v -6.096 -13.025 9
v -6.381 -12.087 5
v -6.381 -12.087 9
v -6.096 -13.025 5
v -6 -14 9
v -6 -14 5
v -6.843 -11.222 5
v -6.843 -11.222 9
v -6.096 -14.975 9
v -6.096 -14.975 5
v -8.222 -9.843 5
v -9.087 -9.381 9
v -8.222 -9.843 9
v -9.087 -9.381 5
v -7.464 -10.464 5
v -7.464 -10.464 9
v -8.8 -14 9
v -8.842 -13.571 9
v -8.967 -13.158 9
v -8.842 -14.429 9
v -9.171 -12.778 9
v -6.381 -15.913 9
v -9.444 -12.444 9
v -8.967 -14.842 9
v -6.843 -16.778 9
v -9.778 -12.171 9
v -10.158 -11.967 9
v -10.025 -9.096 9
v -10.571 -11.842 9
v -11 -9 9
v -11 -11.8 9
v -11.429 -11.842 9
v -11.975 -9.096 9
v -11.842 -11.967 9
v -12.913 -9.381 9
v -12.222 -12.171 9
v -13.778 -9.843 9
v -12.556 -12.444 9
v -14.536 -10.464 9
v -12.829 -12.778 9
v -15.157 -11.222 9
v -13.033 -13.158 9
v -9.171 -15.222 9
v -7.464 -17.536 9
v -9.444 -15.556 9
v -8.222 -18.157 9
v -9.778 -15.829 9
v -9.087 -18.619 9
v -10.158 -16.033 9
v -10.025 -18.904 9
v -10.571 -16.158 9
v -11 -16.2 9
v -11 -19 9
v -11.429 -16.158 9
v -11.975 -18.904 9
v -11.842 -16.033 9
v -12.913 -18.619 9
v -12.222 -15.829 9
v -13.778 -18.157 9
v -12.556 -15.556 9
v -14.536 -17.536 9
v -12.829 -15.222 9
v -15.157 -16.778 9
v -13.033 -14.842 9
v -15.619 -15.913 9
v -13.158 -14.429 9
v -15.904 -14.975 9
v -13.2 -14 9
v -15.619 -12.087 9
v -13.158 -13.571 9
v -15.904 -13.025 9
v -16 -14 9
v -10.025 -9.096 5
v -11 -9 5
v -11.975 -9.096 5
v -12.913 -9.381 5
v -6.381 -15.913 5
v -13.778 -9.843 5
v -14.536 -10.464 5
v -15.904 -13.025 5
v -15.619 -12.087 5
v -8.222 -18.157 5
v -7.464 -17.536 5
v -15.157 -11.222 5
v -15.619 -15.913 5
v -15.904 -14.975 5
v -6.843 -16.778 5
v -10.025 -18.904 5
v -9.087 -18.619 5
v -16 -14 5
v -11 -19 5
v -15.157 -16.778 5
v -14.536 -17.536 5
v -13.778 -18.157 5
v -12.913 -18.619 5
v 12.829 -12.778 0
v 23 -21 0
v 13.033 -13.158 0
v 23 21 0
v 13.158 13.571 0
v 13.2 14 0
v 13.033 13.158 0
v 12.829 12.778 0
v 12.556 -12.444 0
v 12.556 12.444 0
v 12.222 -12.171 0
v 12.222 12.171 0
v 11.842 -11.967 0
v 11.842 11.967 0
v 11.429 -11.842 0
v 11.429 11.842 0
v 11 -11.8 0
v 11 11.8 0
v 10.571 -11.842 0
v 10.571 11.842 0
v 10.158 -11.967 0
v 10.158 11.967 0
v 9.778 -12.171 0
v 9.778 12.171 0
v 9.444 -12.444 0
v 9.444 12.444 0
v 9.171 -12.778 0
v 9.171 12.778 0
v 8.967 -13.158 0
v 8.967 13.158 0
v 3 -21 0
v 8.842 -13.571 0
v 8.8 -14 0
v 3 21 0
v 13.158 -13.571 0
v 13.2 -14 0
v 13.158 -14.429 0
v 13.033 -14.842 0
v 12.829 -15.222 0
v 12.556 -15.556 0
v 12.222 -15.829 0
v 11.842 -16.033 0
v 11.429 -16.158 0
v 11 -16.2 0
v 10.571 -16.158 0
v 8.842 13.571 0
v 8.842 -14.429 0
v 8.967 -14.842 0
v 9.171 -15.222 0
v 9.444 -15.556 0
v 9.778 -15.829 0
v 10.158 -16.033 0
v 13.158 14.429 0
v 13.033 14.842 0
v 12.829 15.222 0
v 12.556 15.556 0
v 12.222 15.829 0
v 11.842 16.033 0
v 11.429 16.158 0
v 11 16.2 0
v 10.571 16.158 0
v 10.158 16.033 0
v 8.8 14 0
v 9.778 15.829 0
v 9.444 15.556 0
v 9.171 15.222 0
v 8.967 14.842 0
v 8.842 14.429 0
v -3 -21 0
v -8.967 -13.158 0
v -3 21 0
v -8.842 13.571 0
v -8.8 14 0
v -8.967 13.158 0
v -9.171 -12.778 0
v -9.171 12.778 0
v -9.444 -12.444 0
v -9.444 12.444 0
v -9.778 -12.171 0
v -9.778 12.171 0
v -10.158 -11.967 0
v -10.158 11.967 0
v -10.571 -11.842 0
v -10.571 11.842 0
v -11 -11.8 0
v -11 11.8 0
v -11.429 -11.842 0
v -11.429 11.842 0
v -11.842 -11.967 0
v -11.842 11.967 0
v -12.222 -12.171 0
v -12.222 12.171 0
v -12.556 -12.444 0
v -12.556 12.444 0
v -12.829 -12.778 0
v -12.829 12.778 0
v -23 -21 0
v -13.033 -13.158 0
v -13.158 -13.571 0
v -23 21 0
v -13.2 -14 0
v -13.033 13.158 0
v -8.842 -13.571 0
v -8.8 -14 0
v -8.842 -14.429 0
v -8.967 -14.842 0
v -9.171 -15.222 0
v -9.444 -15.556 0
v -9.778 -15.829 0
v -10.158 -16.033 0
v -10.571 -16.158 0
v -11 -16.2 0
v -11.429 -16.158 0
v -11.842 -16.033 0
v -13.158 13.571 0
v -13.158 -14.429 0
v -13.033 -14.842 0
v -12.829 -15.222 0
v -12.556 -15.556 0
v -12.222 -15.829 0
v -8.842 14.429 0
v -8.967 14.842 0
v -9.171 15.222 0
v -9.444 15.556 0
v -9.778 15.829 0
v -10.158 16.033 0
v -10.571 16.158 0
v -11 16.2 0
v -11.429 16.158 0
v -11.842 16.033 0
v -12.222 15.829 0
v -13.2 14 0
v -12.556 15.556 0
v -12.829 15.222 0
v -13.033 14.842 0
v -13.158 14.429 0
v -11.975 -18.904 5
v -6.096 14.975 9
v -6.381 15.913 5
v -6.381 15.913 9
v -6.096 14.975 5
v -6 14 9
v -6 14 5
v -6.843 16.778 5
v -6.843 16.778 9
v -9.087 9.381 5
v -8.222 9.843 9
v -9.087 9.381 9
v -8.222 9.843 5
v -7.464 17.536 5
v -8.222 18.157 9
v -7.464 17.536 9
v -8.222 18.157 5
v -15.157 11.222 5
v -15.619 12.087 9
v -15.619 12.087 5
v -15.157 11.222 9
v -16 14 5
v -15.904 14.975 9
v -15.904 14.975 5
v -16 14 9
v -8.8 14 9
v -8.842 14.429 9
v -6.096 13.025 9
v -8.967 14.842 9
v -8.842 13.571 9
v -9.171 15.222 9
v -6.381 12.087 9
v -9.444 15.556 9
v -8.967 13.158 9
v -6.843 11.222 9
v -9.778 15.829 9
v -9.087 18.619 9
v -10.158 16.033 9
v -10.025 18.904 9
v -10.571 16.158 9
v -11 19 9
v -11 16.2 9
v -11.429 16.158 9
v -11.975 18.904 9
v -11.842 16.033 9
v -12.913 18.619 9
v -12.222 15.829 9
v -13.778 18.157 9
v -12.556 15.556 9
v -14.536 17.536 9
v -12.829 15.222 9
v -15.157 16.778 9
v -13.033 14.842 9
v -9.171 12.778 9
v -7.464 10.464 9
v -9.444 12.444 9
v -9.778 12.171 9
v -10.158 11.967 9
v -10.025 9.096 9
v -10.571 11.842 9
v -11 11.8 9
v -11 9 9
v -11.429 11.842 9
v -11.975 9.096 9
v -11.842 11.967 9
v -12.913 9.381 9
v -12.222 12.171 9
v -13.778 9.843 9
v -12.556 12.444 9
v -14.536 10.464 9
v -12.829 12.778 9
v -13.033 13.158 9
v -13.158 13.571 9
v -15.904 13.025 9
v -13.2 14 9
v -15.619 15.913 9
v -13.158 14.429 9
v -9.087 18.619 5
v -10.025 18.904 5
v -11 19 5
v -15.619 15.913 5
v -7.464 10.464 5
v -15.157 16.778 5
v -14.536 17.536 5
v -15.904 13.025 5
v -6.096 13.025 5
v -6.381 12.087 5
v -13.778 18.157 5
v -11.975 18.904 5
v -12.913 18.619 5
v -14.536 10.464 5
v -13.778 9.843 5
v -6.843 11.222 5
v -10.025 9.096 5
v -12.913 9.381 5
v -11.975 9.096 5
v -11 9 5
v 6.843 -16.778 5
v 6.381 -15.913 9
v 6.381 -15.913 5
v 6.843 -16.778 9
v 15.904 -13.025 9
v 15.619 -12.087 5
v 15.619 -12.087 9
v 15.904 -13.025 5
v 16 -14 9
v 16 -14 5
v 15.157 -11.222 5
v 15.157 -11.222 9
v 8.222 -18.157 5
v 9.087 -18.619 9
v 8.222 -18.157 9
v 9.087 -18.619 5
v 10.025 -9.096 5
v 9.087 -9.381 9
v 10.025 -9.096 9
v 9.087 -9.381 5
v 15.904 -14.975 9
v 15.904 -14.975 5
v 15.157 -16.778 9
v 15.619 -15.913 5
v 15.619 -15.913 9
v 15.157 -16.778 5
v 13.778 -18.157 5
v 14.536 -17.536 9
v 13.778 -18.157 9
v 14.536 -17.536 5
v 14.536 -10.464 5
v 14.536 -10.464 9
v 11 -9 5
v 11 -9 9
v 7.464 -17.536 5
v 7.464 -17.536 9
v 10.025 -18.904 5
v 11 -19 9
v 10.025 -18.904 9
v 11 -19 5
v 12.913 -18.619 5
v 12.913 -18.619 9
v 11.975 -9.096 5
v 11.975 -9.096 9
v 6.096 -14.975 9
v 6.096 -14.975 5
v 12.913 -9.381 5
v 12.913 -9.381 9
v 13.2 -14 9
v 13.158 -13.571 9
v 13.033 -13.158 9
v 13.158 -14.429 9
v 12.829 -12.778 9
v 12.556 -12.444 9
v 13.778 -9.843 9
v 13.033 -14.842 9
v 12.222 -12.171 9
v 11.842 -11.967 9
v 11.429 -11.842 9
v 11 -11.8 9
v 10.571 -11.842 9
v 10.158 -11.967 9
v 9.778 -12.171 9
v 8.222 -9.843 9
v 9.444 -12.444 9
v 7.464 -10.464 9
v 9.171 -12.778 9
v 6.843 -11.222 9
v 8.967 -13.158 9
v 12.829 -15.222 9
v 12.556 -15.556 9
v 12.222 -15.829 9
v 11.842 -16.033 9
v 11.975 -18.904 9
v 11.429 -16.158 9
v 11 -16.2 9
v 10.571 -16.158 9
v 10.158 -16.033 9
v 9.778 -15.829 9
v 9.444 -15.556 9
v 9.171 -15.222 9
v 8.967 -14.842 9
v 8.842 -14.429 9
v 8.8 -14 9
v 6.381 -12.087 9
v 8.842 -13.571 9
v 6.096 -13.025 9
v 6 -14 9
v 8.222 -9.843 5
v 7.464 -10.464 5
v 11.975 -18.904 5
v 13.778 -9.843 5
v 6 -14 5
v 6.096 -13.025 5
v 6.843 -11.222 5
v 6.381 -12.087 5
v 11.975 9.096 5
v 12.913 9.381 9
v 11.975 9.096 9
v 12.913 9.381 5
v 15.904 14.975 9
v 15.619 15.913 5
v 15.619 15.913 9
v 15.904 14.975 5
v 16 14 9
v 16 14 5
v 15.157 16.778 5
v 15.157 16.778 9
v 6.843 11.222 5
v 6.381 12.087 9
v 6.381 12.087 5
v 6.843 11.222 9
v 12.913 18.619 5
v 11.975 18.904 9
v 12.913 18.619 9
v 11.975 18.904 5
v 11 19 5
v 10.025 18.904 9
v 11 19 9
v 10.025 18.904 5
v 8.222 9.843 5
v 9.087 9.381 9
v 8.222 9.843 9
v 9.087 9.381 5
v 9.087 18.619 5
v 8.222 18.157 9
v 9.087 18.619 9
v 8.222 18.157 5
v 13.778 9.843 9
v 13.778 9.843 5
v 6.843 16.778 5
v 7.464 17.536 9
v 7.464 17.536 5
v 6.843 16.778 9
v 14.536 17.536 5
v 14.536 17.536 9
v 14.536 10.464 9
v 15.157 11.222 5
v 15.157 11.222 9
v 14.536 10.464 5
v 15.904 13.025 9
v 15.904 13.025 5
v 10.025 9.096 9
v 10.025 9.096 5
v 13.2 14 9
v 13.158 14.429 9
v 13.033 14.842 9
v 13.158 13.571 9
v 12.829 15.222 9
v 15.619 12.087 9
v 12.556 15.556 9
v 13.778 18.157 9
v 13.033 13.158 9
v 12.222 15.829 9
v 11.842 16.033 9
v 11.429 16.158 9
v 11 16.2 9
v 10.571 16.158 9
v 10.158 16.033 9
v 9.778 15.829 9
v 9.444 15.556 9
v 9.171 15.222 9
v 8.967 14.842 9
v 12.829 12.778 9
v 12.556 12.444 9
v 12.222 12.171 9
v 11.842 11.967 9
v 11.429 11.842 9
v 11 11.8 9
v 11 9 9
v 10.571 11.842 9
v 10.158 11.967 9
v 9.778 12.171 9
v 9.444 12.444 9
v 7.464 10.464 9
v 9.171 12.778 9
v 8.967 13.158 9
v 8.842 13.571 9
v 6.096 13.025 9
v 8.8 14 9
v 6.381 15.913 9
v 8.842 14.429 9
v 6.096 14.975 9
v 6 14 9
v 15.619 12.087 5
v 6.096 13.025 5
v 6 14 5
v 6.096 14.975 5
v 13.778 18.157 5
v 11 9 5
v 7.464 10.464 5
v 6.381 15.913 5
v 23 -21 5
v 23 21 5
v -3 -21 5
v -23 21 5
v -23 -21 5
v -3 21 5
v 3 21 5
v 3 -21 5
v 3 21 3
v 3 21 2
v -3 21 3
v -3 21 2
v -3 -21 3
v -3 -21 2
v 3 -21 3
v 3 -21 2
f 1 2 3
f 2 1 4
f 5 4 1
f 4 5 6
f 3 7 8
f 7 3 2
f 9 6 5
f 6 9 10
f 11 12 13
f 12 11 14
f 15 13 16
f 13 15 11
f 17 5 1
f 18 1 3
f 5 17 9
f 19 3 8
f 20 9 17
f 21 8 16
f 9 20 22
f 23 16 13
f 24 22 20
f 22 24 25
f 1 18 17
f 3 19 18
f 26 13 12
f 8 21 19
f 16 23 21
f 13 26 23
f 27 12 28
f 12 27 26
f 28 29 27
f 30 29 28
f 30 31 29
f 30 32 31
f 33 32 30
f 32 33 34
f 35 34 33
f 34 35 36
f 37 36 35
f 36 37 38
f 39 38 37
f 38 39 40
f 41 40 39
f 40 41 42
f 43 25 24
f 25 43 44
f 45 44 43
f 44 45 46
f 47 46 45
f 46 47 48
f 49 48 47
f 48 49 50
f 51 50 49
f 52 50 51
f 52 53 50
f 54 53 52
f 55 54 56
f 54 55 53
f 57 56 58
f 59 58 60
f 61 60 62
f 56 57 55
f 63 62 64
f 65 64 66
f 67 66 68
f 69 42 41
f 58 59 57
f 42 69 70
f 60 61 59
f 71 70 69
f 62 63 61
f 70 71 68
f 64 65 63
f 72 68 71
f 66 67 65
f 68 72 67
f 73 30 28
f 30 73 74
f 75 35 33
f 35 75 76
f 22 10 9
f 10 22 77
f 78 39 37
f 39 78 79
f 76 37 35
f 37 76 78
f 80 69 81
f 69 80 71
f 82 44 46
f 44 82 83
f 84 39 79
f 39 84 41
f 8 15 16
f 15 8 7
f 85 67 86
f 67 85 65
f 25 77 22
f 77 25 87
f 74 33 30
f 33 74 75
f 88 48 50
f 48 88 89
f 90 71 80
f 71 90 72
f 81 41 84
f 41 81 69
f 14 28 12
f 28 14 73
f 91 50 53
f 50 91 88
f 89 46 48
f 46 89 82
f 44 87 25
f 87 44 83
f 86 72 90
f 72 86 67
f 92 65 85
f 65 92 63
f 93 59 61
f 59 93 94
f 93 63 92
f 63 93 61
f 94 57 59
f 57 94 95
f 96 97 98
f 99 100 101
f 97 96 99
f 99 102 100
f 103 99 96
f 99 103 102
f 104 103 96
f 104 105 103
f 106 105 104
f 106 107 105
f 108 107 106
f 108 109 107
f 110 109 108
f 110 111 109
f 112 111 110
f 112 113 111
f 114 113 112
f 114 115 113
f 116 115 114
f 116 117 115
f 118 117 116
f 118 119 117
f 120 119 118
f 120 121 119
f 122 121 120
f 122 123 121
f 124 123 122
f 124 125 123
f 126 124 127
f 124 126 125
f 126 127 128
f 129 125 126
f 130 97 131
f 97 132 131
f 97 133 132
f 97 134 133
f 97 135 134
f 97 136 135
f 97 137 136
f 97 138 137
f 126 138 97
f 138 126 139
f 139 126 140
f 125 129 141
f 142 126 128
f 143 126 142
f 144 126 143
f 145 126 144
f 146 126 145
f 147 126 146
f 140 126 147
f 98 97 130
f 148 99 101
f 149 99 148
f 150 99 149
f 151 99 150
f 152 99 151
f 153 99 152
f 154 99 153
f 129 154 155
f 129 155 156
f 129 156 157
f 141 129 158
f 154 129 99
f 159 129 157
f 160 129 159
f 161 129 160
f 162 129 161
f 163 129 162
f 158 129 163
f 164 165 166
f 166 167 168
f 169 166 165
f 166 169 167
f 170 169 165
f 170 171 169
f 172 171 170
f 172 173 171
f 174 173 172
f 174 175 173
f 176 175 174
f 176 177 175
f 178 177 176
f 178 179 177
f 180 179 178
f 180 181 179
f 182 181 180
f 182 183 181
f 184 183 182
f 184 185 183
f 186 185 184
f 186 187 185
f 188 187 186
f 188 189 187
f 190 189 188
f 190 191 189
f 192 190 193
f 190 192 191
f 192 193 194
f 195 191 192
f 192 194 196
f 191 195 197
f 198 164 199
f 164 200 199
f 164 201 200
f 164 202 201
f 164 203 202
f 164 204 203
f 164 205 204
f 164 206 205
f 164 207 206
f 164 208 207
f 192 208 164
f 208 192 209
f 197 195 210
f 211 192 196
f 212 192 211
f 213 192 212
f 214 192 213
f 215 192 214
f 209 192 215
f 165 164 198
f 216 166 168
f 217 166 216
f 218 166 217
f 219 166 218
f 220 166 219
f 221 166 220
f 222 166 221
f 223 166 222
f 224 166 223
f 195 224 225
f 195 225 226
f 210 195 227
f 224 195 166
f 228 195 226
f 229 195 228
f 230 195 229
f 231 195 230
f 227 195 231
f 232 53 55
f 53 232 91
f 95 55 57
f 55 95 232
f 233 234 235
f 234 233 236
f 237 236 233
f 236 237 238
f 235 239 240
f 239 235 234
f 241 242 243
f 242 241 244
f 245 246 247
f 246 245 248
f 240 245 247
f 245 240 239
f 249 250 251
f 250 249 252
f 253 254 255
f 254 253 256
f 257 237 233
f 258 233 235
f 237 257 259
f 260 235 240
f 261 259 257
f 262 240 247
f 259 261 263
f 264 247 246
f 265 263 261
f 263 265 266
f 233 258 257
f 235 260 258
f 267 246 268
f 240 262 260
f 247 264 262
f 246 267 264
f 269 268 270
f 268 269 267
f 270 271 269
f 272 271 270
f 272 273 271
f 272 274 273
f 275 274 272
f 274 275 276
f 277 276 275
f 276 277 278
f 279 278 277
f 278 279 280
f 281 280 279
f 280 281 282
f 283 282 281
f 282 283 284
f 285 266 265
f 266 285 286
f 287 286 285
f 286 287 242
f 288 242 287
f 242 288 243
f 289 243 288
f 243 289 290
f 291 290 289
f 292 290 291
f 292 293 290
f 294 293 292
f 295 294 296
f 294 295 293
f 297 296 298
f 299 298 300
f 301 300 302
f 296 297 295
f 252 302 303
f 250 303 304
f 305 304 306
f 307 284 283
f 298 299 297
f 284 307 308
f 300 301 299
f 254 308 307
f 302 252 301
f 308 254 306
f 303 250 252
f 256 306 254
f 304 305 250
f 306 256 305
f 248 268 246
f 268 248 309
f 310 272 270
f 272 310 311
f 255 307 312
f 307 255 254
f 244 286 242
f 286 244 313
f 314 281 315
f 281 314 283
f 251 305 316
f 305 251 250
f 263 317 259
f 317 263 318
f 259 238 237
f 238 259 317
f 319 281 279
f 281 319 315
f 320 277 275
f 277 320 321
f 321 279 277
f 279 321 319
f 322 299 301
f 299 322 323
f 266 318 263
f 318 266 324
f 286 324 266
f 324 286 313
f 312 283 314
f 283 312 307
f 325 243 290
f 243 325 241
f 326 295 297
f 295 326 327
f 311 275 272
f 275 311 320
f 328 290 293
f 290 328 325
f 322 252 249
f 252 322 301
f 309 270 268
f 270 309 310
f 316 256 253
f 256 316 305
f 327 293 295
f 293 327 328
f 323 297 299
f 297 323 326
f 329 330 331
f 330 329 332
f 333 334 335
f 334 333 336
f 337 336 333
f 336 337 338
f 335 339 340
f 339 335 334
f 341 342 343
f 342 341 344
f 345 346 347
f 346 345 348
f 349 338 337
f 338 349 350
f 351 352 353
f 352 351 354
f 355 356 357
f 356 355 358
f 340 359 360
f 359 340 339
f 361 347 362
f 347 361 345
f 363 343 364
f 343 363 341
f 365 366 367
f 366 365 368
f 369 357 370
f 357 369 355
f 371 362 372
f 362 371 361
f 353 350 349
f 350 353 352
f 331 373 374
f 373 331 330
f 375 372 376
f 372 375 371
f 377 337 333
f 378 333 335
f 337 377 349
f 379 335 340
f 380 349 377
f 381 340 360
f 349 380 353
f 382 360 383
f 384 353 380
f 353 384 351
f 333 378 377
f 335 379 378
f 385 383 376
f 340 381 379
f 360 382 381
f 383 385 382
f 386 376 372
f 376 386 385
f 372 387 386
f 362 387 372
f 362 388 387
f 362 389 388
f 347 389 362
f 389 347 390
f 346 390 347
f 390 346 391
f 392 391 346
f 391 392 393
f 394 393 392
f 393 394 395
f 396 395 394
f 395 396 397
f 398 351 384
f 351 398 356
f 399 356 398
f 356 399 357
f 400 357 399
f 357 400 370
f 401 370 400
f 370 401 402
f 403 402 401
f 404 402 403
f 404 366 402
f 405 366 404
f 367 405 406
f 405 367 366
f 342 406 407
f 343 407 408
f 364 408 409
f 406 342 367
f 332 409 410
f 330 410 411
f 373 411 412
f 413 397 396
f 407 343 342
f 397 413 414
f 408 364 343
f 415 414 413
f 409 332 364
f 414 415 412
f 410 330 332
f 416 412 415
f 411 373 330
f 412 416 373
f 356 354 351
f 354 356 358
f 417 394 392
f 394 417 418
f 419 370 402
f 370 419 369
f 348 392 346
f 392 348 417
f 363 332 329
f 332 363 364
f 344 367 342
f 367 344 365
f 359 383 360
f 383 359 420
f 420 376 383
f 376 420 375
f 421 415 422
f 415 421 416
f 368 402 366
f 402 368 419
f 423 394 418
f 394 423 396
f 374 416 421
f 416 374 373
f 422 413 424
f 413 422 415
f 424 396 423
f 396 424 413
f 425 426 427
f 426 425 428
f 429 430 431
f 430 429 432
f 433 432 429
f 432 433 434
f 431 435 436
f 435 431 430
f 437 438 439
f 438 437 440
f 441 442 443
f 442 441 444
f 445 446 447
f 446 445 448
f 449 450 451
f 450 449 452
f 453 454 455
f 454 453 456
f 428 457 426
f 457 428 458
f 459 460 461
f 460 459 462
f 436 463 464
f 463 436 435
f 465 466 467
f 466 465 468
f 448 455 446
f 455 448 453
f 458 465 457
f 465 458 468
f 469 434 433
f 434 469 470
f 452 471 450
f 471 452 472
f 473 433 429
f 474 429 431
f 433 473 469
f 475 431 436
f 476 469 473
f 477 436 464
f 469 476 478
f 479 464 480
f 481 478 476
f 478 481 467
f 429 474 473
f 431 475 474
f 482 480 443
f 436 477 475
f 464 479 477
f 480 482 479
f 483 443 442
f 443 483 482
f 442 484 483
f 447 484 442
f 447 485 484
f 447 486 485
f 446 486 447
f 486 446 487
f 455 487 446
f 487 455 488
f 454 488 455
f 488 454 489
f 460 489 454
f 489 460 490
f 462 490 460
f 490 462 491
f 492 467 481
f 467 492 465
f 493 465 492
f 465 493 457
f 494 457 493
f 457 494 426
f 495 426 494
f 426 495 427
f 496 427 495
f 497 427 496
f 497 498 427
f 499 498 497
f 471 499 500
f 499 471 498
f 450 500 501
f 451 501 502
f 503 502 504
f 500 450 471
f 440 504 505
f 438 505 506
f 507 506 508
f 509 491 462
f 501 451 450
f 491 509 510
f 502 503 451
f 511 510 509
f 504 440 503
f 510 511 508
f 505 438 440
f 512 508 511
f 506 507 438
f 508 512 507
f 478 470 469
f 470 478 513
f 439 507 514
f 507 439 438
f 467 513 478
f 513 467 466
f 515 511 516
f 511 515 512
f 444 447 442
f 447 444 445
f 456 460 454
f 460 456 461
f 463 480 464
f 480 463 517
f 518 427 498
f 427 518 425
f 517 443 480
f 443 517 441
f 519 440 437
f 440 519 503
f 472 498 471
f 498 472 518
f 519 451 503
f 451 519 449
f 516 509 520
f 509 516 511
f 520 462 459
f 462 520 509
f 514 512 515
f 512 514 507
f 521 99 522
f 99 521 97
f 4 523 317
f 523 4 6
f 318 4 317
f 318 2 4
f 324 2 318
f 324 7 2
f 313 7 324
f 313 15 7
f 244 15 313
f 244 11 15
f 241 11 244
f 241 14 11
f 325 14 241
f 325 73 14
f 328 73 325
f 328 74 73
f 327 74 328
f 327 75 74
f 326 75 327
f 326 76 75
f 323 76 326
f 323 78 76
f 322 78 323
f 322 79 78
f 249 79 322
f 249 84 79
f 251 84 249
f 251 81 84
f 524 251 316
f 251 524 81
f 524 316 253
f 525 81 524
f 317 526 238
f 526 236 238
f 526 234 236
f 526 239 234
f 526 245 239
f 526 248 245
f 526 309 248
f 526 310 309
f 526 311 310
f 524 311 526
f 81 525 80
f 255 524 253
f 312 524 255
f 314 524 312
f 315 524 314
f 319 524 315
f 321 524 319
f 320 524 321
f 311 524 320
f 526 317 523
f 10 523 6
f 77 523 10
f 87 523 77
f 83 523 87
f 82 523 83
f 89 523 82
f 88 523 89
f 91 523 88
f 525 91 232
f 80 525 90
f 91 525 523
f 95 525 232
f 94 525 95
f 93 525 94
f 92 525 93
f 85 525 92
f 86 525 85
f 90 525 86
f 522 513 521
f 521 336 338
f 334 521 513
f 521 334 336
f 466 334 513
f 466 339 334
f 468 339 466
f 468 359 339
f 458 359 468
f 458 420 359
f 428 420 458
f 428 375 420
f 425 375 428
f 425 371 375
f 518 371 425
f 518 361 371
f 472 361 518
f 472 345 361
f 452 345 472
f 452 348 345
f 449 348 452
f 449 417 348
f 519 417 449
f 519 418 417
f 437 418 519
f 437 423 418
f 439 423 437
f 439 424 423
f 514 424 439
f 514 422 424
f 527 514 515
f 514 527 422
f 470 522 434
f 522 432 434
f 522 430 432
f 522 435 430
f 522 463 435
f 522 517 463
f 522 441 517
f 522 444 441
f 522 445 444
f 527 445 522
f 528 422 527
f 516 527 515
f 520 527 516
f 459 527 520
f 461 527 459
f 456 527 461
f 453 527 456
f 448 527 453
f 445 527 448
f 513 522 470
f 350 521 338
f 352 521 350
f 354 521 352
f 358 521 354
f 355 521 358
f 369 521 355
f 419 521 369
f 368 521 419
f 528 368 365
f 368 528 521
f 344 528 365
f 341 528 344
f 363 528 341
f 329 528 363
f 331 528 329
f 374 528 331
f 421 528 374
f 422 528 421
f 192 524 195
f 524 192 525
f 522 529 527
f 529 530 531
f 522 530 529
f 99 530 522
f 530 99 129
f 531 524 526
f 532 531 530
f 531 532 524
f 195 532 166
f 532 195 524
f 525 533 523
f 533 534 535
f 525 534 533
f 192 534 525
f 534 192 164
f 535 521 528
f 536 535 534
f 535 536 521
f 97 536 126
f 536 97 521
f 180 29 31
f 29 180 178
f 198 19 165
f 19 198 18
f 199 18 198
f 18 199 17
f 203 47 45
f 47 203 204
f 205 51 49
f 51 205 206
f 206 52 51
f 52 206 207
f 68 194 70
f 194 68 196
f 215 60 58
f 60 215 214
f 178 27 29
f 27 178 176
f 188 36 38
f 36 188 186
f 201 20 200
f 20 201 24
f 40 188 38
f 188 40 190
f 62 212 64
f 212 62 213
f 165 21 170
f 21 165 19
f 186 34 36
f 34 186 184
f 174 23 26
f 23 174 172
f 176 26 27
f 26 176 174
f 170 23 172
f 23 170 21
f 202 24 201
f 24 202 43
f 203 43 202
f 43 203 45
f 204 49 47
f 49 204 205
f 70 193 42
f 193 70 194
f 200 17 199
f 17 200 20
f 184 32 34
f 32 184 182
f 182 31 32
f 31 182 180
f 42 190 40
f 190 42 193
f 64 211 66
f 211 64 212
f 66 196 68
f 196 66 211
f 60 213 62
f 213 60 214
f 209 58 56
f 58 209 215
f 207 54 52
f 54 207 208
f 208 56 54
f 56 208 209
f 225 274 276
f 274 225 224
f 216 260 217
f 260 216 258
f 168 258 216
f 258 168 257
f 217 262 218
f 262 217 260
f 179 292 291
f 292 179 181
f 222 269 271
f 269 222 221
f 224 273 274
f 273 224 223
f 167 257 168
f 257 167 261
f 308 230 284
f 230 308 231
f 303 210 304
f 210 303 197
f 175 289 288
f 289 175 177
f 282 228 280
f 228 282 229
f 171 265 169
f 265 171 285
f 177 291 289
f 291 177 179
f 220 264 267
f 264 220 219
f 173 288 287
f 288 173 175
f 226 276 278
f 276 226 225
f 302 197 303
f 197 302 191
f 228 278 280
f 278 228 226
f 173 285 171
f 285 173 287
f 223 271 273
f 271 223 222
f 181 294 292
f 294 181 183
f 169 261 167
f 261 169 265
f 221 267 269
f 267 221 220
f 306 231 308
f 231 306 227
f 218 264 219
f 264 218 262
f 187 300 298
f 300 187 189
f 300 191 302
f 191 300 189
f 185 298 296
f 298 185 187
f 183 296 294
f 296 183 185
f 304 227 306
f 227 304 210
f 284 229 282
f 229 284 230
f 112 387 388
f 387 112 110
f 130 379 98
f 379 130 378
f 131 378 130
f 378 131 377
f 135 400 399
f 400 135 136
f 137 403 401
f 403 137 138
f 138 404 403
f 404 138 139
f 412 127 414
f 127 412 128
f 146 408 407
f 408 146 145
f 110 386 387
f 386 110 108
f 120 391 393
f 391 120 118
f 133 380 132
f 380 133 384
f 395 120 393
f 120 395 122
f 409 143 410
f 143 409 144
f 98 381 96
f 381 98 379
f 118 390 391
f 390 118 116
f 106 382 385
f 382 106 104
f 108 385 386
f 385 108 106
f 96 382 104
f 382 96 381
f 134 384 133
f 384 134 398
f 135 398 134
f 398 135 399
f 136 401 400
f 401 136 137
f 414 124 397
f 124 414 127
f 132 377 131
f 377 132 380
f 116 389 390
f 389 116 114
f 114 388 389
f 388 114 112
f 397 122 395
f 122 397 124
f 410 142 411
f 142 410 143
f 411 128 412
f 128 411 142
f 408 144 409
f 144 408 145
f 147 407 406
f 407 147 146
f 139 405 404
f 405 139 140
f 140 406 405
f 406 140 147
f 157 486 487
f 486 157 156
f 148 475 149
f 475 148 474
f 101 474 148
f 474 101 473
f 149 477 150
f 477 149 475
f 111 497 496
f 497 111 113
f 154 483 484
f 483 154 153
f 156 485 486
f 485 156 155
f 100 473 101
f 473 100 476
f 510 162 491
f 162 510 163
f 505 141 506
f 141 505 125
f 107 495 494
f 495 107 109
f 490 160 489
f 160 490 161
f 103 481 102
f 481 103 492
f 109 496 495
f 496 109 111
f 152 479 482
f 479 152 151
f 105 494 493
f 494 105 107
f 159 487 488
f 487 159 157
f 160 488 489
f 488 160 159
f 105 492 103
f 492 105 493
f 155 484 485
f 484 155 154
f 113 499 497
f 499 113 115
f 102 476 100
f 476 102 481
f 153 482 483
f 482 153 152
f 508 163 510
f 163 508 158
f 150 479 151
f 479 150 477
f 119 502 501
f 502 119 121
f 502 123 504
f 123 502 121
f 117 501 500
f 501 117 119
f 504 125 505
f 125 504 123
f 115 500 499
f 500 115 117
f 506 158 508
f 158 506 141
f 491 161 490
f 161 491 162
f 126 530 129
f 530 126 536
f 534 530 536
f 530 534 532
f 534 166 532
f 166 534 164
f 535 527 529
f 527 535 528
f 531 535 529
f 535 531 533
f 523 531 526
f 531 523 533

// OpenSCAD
$fn = 32;

// ----------------------------------------------------------------------
// Living hinge: 46 x 42 mm plates, 1 mm flexible web
// ----------------------------------------------------------------------

// --- parameters (mm) ---
plate_len = 20;           // plate length outside the web
plate_w = 42;             // plate width
thick = 5;                // plate thickness
web_half = 3;             // half width of the flex band
web_t = 1;                // flexible web thickness
web_z = 2;                // web position inside the thickness
boss_d = 10;              // screw boss diameter
boss_h = 9;               // screw boss height
boss_x = 11;              // screw boss distance from the web
screw_d = 4.4;            // screw hole

difference() {
  union() {
    /* one flat strip, later thinned at the middle */
    translate([-23, -21, 0]) cube([46, 42, 5]);
    /* screw bosses, sunk 0.5 mm into the plates */
    for (sx = [-11, 11]) {
      for (sy = [-14, 14]) {
        translate([sx, sy, 0]) cylinder(h = boss_h, d = boss_d);
      }
    }
  }
  /* channel from below: leaves the web on top of it */
  translate([-3, -23.5, -2.5]) cube([6, 47, 4.5]);
  /* channel from above: thins the web down to web_t */
  translate([-3, -23.5, 3]) cube([6, 47, 4.5]);
  /* screw holes through the bosses */
  for (sx = [-11, 11]) {
    for (sy = [-14, 14]) {
      translate([sx, sy, -2.5]) cylinder(h = boss_h + 5, d = screw_d);
    }
  }
}
